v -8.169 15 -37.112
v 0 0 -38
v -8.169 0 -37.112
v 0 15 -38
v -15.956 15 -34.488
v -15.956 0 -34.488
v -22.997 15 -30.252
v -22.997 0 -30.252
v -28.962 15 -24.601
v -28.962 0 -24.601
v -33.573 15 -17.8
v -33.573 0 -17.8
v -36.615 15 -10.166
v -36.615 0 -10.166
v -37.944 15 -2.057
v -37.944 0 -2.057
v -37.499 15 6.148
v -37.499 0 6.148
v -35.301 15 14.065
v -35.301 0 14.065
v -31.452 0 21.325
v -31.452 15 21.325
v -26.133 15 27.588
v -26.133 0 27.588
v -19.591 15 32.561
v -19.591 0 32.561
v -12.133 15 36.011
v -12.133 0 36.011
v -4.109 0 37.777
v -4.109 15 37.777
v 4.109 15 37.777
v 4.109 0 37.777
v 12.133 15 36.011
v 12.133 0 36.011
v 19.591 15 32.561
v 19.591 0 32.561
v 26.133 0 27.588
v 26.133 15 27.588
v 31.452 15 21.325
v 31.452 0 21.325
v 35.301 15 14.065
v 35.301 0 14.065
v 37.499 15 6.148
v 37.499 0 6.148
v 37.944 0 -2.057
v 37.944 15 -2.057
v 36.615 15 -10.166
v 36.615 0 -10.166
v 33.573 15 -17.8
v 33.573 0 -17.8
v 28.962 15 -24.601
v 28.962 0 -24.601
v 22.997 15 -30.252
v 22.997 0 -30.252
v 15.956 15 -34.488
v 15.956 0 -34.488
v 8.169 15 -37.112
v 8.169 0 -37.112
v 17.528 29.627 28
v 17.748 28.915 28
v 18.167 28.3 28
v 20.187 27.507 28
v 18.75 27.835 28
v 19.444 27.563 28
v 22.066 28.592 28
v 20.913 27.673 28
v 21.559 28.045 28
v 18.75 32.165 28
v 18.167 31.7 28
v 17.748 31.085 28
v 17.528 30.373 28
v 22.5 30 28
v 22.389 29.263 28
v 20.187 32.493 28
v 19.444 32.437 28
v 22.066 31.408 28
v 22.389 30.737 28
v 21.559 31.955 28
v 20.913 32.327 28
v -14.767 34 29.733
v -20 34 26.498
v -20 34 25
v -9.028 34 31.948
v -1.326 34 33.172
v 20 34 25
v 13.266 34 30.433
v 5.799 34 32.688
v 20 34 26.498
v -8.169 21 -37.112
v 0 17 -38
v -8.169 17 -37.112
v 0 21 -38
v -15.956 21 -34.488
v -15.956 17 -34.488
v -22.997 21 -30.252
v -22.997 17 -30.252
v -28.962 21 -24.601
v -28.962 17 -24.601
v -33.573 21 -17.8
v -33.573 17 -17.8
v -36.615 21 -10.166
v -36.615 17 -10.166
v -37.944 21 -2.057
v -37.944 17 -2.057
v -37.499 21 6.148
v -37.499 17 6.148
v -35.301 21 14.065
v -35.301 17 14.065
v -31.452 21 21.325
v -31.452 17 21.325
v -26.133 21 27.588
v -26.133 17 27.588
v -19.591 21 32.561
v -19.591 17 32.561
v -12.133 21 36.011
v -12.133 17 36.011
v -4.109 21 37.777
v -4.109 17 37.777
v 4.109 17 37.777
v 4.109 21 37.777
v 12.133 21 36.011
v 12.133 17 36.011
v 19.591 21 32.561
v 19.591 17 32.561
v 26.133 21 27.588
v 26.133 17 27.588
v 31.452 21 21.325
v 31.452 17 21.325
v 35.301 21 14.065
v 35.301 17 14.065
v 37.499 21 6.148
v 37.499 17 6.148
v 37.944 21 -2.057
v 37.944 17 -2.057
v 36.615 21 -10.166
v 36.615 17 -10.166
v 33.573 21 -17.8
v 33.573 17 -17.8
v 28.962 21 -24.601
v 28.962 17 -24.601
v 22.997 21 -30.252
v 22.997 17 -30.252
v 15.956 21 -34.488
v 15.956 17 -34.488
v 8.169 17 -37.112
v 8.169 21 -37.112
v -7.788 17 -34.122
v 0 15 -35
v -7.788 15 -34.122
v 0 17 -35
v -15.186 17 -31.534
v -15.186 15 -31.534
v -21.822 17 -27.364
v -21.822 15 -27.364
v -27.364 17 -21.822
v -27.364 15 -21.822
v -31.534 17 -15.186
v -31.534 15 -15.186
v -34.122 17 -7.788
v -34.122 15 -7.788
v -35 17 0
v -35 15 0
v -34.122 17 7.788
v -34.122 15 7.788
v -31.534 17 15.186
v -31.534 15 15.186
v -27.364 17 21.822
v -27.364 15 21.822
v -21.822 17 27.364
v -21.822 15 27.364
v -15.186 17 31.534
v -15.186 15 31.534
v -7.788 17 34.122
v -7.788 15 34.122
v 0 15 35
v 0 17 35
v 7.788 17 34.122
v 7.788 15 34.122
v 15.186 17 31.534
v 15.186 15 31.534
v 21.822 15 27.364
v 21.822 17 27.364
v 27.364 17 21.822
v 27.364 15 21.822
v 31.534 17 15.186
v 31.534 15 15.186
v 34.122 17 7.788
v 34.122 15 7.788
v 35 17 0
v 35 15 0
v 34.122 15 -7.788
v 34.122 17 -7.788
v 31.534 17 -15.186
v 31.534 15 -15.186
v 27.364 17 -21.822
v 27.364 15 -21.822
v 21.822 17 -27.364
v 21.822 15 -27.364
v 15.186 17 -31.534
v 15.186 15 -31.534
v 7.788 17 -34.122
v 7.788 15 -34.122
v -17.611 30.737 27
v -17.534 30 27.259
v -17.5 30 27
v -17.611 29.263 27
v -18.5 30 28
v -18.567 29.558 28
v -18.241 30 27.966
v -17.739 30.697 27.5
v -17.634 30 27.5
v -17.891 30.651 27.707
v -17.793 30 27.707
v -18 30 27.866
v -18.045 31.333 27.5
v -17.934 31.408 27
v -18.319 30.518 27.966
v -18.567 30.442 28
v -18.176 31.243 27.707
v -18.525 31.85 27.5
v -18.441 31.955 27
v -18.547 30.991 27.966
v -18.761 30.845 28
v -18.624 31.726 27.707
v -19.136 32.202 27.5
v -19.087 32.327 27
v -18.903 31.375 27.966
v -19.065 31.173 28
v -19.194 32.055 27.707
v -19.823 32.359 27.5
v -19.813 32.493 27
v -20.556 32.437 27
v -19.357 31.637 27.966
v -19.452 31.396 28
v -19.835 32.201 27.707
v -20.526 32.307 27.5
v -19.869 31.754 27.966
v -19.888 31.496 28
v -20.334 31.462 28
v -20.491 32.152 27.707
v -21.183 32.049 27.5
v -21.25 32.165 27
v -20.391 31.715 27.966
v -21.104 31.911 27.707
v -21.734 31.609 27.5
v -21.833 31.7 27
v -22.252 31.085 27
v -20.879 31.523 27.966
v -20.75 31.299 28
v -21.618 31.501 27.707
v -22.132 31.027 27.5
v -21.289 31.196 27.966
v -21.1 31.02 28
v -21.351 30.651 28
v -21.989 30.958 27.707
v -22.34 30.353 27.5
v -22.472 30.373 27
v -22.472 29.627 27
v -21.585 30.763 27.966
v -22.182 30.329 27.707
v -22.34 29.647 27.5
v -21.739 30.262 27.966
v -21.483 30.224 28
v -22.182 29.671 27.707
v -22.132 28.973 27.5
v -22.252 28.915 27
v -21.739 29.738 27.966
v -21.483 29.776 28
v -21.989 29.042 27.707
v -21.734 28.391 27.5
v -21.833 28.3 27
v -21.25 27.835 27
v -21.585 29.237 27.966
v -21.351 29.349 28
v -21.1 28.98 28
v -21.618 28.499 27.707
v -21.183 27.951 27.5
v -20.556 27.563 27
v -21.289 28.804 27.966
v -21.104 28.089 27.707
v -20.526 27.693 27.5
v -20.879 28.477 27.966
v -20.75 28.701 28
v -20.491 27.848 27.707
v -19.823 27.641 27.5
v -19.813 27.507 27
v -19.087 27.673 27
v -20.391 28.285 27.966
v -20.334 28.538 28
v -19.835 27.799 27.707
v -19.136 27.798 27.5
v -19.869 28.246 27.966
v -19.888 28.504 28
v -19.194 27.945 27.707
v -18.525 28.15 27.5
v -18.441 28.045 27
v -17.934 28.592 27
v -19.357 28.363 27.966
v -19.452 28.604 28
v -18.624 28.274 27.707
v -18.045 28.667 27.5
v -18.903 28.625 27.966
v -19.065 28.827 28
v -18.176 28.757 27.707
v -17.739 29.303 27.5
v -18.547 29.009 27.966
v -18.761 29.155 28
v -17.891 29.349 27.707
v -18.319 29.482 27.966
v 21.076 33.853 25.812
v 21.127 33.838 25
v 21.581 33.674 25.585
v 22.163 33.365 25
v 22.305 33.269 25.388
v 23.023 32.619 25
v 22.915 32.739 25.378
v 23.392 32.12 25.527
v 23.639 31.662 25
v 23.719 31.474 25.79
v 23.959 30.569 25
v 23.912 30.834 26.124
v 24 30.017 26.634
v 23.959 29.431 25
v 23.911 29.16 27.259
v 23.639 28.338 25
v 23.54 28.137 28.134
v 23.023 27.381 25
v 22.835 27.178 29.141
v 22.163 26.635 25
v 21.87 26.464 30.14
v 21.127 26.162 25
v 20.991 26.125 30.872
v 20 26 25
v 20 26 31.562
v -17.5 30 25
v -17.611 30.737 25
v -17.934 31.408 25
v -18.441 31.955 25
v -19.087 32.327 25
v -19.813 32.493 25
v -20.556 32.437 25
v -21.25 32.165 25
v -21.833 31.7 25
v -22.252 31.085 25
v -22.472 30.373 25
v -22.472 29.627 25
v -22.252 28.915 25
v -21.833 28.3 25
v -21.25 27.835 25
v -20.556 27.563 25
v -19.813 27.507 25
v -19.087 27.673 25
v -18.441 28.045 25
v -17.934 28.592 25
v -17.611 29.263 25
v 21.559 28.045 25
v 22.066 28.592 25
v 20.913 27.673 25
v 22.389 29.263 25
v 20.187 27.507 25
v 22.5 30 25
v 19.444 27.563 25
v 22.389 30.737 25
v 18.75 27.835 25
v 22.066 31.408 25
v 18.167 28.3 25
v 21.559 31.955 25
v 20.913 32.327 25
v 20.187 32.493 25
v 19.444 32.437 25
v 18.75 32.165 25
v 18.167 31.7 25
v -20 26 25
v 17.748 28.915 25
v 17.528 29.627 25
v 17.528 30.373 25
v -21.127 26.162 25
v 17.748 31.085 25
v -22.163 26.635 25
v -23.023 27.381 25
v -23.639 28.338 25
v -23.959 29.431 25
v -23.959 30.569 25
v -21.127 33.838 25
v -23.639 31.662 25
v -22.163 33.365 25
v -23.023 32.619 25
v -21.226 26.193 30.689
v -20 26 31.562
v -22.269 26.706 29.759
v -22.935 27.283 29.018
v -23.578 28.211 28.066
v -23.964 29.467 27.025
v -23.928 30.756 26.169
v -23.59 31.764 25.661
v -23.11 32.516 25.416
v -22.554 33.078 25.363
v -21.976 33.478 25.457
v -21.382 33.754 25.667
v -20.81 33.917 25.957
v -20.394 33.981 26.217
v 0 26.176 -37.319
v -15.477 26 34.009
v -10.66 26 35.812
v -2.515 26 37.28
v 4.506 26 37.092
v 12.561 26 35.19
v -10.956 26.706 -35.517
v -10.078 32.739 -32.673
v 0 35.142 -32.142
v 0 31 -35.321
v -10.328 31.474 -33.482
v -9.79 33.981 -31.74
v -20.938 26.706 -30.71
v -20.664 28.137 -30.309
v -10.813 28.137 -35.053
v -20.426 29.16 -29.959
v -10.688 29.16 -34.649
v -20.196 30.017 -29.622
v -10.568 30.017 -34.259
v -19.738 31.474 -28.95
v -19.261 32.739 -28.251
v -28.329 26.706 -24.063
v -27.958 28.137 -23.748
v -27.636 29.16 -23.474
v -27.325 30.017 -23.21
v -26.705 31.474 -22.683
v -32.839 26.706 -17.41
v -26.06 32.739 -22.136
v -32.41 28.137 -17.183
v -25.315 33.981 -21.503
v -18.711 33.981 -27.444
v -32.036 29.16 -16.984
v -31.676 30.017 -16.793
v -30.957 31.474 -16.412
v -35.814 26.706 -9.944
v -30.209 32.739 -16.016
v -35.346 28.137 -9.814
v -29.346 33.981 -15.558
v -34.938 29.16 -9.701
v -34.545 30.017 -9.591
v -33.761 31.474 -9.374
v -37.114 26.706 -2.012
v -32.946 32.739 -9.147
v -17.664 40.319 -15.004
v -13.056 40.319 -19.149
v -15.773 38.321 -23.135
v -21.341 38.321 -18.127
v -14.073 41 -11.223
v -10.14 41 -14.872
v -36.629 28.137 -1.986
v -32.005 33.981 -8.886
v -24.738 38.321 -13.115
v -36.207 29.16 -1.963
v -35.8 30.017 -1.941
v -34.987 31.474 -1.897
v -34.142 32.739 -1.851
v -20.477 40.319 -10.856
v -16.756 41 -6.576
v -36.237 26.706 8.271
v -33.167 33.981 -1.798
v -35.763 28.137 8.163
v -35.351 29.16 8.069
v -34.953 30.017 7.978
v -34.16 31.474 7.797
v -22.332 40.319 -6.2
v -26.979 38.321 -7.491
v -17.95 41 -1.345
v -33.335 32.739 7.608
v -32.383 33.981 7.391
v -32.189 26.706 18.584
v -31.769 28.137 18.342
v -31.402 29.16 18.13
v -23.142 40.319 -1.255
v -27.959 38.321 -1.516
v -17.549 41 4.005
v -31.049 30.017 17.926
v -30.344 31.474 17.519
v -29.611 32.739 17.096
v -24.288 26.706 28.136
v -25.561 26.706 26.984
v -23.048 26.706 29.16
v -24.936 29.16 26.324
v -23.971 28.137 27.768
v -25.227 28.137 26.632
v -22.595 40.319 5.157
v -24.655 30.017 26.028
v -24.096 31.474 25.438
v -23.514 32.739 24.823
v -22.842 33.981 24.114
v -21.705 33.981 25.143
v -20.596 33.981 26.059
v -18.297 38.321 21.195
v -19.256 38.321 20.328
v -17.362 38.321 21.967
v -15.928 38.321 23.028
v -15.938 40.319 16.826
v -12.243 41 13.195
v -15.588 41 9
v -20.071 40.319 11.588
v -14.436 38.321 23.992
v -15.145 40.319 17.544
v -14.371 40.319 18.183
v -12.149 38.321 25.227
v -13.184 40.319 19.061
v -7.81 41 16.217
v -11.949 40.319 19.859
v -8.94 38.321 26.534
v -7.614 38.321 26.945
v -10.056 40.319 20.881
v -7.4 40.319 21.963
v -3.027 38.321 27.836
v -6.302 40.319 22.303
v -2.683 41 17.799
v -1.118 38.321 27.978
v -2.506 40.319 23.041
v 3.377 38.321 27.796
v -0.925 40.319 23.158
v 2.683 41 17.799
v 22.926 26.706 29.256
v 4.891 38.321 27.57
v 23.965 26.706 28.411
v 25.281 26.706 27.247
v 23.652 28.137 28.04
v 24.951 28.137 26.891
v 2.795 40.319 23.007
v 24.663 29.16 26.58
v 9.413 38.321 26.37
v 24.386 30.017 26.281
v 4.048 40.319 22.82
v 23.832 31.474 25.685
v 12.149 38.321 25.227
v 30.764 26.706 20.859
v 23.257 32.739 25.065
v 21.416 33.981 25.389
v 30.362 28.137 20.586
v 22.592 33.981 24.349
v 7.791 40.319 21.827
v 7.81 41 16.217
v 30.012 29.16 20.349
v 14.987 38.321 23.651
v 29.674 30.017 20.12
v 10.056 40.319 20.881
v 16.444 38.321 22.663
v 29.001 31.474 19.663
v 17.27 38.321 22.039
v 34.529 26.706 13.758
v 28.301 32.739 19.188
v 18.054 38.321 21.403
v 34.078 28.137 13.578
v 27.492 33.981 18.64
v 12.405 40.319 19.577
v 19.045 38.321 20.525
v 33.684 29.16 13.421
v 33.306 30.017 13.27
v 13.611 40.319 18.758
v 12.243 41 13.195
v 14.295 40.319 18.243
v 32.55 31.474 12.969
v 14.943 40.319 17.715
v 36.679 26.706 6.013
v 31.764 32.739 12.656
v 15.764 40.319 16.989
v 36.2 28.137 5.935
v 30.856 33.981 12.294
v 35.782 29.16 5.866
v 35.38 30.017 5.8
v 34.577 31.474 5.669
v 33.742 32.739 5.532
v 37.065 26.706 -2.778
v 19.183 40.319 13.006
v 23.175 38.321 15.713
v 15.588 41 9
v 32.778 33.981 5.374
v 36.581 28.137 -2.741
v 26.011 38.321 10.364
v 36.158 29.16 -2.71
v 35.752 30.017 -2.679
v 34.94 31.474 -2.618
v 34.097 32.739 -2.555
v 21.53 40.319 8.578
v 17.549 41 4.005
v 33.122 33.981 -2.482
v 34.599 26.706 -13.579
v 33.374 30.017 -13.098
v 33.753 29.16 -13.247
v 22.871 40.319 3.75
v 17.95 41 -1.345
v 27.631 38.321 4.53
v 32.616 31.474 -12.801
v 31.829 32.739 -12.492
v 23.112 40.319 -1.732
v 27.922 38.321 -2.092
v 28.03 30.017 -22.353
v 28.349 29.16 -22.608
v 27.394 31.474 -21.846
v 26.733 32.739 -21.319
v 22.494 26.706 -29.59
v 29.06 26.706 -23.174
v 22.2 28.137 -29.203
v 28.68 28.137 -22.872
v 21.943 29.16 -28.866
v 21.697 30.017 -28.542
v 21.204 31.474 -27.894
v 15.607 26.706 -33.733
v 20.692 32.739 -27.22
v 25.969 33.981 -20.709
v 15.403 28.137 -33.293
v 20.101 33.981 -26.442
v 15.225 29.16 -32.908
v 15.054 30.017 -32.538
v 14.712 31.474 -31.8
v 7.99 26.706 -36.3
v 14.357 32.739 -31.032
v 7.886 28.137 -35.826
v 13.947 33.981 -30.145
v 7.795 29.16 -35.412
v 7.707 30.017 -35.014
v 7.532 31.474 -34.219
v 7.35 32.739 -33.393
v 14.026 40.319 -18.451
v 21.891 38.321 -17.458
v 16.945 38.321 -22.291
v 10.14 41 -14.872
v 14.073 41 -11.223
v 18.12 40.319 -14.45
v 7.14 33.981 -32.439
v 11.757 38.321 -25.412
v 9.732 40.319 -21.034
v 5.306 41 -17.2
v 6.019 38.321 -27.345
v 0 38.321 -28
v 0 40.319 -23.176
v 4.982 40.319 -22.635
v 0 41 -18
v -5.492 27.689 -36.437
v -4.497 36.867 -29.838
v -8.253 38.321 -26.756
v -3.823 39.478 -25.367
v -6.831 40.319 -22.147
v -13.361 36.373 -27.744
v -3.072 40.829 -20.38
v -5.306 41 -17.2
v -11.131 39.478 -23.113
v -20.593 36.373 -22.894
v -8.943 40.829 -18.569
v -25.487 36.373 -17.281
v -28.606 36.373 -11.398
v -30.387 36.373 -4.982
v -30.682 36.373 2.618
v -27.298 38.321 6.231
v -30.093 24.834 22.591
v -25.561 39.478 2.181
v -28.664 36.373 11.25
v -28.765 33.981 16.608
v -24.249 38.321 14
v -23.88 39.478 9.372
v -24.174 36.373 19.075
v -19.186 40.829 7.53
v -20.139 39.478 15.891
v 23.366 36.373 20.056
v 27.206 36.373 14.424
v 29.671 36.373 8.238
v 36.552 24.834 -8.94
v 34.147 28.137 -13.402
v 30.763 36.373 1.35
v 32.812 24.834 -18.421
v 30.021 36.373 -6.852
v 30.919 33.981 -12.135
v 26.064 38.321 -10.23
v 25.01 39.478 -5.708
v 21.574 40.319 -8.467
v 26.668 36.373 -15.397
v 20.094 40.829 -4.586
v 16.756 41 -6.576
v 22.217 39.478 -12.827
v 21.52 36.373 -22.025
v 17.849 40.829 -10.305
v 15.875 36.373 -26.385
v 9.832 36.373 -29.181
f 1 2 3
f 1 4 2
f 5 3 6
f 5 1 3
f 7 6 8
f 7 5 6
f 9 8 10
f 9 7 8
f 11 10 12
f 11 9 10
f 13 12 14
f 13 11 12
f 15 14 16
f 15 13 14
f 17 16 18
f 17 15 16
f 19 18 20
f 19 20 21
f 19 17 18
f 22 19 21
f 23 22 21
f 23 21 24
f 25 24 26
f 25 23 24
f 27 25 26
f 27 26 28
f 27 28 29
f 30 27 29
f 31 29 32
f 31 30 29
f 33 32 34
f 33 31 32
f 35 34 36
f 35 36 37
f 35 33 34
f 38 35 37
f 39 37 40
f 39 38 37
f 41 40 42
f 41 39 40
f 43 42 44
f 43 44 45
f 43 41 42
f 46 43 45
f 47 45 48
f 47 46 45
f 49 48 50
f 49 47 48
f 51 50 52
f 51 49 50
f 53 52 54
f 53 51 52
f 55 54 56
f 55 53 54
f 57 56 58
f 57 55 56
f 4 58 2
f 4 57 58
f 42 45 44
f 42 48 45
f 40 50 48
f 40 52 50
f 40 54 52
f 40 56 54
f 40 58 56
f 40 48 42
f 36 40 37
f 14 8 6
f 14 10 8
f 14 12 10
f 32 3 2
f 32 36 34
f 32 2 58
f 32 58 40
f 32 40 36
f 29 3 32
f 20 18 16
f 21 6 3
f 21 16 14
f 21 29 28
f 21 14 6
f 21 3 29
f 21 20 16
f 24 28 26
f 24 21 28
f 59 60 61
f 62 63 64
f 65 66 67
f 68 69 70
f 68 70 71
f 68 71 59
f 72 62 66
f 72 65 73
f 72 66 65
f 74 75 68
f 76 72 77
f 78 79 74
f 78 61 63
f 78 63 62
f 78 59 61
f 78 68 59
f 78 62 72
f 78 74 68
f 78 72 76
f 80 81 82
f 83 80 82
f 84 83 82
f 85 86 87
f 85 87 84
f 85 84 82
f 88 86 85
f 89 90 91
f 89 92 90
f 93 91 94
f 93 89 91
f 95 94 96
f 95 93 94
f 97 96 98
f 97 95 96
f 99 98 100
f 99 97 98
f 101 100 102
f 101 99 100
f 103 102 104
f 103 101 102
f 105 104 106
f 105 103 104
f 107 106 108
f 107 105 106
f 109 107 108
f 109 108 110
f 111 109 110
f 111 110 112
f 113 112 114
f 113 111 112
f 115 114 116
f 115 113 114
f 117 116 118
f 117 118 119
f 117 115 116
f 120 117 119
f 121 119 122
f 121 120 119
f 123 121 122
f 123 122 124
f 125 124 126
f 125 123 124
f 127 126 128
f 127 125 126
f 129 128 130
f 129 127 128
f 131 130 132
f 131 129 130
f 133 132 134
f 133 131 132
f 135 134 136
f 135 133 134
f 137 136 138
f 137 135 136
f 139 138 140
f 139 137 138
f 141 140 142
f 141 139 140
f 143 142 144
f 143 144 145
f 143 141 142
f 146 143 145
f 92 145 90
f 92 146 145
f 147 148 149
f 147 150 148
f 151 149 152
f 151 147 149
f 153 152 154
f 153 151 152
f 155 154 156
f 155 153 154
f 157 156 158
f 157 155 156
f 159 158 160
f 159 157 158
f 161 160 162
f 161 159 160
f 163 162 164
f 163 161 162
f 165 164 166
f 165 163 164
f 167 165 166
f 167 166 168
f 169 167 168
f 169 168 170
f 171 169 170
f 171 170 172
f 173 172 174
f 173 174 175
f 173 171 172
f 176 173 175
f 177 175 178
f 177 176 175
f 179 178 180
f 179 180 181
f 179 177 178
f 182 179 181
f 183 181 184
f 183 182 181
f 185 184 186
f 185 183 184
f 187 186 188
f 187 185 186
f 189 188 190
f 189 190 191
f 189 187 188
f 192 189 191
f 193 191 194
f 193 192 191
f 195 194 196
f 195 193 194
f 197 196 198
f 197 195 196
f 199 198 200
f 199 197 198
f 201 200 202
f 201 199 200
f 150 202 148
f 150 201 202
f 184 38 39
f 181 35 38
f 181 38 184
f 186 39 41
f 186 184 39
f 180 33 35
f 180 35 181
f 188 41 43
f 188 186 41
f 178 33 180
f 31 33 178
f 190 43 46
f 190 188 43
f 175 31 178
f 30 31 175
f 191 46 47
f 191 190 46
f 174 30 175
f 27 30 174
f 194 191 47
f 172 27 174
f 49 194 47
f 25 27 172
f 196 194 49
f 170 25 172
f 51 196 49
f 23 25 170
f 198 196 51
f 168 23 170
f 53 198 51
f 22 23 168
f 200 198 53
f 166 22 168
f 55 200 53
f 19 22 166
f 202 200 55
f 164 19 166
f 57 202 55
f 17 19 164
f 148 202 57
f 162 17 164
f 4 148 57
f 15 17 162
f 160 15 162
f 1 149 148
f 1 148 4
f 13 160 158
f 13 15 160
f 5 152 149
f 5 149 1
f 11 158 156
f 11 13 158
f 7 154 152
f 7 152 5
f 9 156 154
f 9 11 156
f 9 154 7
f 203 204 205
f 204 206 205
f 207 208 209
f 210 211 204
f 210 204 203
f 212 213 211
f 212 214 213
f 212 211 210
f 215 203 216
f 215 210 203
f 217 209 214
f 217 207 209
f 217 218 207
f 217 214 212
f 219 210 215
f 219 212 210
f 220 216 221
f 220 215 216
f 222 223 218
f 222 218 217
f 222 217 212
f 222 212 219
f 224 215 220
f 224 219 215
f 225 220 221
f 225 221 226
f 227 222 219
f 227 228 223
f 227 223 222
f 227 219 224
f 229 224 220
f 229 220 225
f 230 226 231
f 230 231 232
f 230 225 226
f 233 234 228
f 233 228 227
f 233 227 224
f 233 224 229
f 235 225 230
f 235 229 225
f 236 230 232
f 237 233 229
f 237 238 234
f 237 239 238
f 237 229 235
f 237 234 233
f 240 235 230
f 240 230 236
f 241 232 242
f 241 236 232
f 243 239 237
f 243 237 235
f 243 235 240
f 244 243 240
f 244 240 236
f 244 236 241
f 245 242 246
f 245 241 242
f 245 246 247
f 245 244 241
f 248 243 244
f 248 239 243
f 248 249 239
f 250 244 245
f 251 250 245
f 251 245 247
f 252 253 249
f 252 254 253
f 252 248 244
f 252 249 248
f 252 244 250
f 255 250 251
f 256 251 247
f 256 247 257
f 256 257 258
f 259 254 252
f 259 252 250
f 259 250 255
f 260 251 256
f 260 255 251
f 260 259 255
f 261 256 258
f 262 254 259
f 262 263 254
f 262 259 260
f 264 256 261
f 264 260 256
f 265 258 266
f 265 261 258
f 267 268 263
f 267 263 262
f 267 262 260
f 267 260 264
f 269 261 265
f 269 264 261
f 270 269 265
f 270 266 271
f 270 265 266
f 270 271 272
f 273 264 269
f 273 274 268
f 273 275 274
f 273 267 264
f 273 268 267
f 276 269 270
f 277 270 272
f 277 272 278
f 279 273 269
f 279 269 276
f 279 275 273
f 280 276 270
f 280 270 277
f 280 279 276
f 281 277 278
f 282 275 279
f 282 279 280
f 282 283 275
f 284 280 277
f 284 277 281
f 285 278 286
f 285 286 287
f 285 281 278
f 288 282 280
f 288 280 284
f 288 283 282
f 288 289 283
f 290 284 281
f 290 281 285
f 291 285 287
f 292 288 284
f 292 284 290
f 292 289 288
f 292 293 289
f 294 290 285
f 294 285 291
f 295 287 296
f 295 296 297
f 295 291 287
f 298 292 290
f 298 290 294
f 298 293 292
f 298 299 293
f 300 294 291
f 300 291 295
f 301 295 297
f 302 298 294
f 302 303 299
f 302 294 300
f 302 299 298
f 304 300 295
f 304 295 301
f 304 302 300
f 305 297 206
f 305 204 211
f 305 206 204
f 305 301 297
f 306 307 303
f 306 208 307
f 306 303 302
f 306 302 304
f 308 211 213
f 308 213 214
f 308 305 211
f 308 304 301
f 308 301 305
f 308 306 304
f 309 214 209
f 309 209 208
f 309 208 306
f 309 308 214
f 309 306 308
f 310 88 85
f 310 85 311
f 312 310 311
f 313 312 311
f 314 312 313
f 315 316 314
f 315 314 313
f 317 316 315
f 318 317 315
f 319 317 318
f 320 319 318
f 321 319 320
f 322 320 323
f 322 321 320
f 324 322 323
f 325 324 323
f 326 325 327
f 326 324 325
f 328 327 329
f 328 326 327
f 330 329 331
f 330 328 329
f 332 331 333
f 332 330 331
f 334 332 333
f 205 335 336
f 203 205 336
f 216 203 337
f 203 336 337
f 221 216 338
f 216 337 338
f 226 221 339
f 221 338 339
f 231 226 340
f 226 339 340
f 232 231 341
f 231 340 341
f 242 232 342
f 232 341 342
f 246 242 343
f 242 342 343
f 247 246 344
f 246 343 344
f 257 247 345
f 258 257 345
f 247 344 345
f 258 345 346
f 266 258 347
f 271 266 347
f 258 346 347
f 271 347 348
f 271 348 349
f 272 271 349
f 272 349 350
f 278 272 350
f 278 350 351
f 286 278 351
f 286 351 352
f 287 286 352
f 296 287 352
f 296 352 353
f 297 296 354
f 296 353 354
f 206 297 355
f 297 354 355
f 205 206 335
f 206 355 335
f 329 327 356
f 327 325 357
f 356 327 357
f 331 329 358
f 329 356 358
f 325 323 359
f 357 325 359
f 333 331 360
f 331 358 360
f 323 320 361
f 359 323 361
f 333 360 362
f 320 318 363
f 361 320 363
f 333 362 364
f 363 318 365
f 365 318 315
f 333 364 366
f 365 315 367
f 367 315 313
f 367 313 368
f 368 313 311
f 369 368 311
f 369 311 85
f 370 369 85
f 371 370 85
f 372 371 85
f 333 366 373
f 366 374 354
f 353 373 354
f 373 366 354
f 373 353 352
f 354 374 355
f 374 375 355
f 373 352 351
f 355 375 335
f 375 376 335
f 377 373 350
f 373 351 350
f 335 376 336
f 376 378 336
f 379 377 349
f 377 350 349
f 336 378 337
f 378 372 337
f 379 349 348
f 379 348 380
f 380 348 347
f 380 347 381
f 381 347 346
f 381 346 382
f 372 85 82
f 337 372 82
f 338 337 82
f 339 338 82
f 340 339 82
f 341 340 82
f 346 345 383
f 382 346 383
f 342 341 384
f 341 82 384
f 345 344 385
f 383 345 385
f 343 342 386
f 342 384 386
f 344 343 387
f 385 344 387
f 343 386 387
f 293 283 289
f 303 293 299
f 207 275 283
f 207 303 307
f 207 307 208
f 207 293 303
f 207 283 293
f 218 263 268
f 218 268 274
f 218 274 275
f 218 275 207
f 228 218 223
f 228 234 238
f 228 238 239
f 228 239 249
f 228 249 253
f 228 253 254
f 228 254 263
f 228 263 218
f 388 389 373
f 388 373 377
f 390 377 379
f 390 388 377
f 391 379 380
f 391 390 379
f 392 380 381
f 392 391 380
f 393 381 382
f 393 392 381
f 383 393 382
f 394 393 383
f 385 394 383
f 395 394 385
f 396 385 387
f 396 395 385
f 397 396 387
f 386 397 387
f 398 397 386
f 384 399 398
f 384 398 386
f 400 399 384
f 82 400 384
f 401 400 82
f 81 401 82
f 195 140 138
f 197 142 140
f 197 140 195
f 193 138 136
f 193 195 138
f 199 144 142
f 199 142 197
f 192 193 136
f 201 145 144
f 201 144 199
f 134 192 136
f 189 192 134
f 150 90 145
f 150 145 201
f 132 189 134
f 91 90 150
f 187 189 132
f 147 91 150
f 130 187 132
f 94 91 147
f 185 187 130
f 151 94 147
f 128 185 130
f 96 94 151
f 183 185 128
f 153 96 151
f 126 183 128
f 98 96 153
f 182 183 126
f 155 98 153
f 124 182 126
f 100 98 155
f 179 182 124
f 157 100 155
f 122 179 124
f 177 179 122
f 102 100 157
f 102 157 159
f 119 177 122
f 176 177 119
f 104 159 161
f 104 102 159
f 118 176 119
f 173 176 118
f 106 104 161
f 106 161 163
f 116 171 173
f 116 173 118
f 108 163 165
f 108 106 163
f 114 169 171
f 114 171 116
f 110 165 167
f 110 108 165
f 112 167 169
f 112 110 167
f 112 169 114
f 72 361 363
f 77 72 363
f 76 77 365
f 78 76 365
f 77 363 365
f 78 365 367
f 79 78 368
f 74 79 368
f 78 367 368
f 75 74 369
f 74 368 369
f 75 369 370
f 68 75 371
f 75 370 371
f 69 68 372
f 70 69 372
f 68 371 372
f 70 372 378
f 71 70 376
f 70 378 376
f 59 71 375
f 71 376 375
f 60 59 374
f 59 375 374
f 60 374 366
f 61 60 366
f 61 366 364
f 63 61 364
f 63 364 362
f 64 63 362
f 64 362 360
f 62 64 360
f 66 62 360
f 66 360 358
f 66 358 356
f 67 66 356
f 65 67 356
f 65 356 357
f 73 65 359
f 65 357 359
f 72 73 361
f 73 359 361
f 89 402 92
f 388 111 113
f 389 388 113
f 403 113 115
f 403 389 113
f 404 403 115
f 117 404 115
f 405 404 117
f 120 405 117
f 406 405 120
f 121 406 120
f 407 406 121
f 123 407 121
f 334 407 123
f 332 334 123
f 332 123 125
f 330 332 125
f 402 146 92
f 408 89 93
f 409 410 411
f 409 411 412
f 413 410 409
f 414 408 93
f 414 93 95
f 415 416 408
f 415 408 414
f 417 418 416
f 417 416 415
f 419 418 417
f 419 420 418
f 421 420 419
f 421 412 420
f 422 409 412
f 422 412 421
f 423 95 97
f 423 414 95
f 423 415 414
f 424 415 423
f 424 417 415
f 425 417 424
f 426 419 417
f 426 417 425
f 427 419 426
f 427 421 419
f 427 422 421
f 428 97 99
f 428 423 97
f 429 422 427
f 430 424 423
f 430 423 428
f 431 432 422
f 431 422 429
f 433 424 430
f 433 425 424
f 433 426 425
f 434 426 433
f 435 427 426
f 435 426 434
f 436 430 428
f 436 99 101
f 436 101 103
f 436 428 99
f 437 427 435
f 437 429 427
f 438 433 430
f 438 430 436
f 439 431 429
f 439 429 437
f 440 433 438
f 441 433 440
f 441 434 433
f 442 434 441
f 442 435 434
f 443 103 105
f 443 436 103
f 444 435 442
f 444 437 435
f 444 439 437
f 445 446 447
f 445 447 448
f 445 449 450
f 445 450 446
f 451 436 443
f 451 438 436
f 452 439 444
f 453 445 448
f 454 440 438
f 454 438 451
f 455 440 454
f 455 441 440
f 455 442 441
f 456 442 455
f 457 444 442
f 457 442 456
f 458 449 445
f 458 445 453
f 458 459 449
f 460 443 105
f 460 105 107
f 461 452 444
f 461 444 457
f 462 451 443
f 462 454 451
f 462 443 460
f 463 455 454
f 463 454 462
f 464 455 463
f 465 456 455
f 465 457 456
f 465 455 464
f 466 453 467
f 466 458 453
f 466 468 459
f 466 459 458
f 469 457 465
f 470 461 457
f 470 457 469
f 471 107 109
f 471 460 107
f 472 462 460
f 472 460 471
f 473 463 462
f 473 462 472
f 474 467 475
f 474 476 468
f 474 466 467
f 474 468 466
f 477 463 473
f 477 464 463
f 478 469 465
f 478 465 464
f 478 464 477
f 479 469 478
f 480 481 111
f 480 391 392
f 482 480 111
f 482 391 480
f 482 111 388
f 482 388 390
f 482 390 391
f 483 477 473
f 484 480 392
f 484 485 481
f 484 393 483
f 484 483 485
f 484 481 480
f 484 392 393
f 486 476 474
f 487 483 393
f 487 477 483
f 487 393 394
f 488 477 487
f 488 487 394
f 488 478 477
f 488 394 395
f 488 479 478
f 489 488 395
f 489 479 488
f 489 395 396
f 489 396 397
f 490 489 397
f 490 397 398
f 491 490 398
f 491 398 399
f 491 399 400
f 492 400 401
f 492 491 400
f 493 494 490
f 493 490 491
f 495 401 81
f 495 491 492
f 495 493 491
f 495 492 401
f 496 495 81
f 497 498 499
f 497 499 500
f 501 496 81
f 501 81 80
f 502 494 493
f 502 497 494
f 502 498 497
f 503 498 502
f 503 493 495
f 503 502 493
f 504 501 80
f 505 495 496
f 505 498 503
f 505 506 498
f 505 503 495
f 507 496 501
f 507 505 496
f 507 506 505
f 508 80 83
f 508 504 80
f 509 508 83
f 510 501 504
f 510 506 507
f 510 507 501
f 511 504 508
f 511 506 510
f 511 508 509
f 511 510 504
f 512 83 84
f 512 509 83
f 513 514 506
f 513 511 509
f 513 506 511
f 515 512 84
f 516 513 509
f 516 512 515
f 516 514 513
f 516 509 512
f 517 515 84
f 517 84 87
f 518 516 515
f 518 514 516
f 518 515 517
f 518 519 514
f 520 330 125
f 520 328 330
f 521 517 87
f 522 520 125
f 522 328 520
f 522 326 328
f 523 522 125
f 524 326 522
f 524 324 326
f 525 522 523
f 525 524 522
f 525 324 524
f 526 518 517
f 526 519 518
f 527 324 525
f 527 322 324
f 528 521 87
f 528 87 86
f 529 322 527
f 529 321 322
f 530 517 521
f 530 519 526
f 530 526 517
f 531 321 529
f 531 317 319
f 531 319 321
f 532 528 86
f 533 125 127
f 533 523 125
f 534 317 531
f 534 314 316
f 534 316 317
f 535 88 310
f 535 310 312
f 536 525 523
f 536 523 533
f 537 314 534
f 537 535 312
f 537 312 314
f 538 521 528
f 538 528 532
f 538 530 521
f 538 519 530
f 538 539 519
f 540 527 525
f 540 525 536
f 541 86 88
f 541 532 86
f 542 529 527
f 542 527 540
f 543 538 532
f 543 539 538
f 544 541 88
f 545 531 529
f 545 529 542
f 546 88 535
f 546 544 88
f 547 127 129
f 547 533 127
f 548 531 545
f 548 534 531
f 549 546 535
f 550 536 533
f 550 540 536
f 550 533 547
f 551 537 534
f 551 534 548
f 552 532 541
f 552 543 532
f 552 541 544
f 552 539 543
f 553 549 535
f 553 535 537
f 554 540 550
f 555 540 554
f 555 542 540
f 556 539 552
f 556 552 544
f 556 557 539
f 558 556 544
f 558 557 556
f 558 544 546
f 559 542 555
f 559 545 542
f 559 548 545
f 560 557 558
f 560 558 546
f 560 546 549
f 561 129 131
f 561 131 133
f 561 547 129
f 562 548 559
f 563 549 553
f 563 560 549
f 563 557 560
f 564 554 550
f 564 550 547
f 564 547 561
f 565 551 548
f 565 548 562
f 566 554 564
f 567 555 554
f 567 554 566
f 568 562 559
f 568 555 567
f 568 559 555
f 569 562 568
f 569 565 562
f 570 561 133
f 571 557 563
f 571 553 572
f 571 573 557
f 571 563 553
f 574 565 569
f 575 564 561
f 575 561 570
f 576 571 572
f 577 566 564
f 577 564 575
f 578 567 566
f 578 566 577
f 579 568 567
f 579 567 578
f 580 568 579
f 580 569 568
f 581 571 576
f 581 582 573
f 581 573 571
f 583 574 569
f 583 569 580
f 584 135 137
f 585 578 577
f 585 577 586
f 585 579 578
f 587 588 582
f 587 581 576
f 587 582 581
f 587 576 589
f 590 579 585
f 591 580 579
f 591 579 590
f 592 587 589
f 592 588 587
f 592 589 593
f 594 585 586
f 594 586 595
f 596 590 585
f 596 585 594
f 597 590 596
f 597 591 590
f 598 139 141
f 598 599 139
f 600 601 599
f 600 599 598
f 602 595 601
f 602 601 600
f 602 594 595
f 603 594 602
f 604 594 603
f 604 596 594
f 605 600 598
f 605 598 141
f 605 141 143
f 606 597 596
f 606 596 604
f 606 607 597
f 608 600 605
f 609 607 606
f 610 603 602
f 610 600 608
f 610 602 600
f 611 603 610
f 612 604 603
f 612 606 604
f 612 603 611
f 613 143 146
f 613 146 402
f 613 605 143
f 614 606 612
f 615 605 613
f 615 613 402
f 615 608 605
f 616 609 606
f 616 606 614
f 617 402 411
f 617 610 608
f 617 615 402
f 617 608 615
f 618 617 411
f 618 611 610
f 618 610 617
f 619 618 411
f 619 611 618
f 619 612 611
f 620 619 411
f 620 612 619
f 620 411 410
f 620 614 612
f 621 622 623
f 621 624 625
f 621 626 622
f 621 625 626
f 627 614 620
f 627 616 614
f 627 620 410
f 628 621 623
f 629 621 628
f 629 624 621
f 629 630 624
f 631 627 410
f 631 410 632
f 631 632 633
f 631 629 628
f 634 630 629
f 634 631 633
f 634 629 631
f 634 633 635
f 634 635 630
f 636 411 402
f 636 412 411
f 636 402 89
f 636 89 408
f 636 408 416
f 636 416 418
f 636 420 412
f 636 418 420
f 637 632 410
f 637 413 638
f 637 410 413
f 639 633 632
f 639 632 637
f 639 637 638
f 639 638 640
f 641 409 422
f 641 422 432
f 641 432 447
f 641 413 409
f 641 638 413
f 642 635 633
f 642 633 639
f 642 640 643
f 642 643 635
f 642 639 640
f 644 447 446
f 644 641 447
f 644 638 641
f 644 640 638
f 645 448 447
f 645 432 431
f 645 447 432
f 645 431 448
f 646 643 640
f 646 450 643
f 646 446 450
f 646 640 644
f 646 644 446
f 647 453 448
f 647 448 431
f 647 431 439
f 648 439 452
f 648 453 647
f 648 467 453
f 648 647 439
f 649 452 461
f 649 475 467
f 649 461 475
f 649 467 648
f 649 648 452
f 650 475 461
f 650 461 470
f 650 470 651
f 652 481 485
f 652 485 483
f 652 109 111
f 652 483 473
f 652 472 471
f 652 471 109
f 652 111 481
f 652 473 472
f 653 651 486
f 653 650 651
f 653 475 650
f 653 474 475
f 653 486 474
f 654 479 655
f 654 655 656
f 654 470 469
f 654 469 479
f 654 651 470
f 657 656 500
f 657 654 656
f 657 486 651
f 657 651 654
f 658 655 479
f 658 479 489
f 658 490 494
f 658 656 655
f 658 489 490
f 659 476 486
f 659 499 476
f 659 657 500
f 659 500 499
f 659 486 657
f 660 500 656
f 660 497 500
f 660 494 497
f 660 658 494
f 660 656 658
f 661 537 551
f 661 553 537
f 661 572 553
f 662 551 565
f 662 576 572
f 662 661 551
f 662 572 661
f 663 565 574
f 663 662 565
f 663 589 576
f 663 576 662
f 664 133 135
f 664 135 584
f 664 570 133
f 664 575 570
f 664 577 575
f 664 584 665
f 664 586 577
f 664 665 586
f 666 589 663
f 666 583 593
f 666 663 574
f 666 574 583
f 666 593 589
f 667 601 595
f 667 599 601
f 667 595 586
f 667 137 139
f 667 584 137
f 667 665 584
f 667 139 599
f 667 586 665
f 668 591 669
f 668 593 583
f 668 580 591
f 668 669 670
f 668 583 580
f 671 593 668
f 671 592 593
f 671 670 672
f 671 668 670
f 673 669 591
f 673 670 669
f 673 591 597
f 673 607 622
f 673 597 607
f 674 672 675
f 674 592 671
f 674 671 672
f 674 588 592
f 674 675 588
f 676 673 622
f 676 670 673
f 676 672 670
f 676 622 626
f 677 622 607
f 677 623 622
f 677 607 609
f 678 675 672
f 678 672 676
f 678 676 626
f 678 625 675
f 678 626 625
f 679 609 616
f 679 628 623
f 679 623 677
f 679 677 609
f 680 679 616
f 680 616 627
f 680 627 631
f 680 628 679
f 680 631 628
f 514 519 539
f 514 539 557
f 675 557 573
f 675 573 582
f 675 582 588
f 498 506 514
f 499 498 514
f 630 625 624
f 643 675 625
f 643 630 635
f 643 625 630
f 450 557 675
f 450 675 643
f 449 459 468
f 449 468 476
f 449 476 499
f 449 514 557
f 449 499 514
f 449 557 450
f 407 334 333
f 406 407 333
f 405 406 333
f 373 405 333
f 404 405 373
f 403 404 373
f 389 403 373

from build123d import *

# Parameters (mm, degrees)
CUT_EXTRUDE_START   = 40
CUT_EXTRUDE_1_DEPTH = 15
SKETCH_3_R          = 2.5
EXTRUDE_1_DEPTH     = 3
FILLET_1_R          = 1


with BuildPart() as part:
    # 草图1 → 旋转1 (revolve)
    with BuildSketch(Plane.XY, mode=Mode.PRIVATE) as revolve_1_sk:
        with BuildLine():
            Line((0, 0), (38, 0))
            Line((38, 0), (38, 15))
            Line((38, 15), (35, 15))
            Line((35, 15), (35, 17))
            Line((35, 17), (38, 17))
            Line((38, 17), (38, 21))
            ThreePointArc((38, 21), (32.142135624, 35.142135624), (18, 41))
            Line((18, 41), (0, 41))
            Line((0, 41), (0, 0))
        make_face()
    revolve(revolve_1_sk.sketch.rotate(Axis((0, 0, 0), (0, 1, 0)), 90), axis=Axis((0, 0, 0), (0, 1, 0)))

    # 草图2 → 切除-拉伸1 (cut)
    with BuildSketch(Plane.XY.offset(CUT_EXTRUDE_START)):
        with BuildLine():
            Line((-20, 34), (20, 34))
            ThreePointArc((20, 34), (24, 30), (20, 26))
            Line((20, 26), (-20, 26))
            ThreePointArc((-20, 26), (-24, 30), (-20, 34))
        make_face()
    extrude(amount=-CUT_EXTRUDE_1_DEPTH, mode=Mode.SUBTRACT)

    # 草图3 → 凸台-拉伸1 (add)
    with BuildSketch(Plane.XY.offset(25)):
        with Locations((-20, 30)):
            Circle(SKETCH_3_R)
        with Locations((20, 30)):
            Circle(SKETCH_3_R)
    extrude(amount=EXTRUDE_1_DEPTH)

    # 圆角1
    fillet_1_edges = [part.edges().sort_by_distance(p)[0] for p in [
        (-22.5, 30, 28),
    ]]
    fillet(fillet_1_edges, radius=FILLET_1_R)


solid = part.part
